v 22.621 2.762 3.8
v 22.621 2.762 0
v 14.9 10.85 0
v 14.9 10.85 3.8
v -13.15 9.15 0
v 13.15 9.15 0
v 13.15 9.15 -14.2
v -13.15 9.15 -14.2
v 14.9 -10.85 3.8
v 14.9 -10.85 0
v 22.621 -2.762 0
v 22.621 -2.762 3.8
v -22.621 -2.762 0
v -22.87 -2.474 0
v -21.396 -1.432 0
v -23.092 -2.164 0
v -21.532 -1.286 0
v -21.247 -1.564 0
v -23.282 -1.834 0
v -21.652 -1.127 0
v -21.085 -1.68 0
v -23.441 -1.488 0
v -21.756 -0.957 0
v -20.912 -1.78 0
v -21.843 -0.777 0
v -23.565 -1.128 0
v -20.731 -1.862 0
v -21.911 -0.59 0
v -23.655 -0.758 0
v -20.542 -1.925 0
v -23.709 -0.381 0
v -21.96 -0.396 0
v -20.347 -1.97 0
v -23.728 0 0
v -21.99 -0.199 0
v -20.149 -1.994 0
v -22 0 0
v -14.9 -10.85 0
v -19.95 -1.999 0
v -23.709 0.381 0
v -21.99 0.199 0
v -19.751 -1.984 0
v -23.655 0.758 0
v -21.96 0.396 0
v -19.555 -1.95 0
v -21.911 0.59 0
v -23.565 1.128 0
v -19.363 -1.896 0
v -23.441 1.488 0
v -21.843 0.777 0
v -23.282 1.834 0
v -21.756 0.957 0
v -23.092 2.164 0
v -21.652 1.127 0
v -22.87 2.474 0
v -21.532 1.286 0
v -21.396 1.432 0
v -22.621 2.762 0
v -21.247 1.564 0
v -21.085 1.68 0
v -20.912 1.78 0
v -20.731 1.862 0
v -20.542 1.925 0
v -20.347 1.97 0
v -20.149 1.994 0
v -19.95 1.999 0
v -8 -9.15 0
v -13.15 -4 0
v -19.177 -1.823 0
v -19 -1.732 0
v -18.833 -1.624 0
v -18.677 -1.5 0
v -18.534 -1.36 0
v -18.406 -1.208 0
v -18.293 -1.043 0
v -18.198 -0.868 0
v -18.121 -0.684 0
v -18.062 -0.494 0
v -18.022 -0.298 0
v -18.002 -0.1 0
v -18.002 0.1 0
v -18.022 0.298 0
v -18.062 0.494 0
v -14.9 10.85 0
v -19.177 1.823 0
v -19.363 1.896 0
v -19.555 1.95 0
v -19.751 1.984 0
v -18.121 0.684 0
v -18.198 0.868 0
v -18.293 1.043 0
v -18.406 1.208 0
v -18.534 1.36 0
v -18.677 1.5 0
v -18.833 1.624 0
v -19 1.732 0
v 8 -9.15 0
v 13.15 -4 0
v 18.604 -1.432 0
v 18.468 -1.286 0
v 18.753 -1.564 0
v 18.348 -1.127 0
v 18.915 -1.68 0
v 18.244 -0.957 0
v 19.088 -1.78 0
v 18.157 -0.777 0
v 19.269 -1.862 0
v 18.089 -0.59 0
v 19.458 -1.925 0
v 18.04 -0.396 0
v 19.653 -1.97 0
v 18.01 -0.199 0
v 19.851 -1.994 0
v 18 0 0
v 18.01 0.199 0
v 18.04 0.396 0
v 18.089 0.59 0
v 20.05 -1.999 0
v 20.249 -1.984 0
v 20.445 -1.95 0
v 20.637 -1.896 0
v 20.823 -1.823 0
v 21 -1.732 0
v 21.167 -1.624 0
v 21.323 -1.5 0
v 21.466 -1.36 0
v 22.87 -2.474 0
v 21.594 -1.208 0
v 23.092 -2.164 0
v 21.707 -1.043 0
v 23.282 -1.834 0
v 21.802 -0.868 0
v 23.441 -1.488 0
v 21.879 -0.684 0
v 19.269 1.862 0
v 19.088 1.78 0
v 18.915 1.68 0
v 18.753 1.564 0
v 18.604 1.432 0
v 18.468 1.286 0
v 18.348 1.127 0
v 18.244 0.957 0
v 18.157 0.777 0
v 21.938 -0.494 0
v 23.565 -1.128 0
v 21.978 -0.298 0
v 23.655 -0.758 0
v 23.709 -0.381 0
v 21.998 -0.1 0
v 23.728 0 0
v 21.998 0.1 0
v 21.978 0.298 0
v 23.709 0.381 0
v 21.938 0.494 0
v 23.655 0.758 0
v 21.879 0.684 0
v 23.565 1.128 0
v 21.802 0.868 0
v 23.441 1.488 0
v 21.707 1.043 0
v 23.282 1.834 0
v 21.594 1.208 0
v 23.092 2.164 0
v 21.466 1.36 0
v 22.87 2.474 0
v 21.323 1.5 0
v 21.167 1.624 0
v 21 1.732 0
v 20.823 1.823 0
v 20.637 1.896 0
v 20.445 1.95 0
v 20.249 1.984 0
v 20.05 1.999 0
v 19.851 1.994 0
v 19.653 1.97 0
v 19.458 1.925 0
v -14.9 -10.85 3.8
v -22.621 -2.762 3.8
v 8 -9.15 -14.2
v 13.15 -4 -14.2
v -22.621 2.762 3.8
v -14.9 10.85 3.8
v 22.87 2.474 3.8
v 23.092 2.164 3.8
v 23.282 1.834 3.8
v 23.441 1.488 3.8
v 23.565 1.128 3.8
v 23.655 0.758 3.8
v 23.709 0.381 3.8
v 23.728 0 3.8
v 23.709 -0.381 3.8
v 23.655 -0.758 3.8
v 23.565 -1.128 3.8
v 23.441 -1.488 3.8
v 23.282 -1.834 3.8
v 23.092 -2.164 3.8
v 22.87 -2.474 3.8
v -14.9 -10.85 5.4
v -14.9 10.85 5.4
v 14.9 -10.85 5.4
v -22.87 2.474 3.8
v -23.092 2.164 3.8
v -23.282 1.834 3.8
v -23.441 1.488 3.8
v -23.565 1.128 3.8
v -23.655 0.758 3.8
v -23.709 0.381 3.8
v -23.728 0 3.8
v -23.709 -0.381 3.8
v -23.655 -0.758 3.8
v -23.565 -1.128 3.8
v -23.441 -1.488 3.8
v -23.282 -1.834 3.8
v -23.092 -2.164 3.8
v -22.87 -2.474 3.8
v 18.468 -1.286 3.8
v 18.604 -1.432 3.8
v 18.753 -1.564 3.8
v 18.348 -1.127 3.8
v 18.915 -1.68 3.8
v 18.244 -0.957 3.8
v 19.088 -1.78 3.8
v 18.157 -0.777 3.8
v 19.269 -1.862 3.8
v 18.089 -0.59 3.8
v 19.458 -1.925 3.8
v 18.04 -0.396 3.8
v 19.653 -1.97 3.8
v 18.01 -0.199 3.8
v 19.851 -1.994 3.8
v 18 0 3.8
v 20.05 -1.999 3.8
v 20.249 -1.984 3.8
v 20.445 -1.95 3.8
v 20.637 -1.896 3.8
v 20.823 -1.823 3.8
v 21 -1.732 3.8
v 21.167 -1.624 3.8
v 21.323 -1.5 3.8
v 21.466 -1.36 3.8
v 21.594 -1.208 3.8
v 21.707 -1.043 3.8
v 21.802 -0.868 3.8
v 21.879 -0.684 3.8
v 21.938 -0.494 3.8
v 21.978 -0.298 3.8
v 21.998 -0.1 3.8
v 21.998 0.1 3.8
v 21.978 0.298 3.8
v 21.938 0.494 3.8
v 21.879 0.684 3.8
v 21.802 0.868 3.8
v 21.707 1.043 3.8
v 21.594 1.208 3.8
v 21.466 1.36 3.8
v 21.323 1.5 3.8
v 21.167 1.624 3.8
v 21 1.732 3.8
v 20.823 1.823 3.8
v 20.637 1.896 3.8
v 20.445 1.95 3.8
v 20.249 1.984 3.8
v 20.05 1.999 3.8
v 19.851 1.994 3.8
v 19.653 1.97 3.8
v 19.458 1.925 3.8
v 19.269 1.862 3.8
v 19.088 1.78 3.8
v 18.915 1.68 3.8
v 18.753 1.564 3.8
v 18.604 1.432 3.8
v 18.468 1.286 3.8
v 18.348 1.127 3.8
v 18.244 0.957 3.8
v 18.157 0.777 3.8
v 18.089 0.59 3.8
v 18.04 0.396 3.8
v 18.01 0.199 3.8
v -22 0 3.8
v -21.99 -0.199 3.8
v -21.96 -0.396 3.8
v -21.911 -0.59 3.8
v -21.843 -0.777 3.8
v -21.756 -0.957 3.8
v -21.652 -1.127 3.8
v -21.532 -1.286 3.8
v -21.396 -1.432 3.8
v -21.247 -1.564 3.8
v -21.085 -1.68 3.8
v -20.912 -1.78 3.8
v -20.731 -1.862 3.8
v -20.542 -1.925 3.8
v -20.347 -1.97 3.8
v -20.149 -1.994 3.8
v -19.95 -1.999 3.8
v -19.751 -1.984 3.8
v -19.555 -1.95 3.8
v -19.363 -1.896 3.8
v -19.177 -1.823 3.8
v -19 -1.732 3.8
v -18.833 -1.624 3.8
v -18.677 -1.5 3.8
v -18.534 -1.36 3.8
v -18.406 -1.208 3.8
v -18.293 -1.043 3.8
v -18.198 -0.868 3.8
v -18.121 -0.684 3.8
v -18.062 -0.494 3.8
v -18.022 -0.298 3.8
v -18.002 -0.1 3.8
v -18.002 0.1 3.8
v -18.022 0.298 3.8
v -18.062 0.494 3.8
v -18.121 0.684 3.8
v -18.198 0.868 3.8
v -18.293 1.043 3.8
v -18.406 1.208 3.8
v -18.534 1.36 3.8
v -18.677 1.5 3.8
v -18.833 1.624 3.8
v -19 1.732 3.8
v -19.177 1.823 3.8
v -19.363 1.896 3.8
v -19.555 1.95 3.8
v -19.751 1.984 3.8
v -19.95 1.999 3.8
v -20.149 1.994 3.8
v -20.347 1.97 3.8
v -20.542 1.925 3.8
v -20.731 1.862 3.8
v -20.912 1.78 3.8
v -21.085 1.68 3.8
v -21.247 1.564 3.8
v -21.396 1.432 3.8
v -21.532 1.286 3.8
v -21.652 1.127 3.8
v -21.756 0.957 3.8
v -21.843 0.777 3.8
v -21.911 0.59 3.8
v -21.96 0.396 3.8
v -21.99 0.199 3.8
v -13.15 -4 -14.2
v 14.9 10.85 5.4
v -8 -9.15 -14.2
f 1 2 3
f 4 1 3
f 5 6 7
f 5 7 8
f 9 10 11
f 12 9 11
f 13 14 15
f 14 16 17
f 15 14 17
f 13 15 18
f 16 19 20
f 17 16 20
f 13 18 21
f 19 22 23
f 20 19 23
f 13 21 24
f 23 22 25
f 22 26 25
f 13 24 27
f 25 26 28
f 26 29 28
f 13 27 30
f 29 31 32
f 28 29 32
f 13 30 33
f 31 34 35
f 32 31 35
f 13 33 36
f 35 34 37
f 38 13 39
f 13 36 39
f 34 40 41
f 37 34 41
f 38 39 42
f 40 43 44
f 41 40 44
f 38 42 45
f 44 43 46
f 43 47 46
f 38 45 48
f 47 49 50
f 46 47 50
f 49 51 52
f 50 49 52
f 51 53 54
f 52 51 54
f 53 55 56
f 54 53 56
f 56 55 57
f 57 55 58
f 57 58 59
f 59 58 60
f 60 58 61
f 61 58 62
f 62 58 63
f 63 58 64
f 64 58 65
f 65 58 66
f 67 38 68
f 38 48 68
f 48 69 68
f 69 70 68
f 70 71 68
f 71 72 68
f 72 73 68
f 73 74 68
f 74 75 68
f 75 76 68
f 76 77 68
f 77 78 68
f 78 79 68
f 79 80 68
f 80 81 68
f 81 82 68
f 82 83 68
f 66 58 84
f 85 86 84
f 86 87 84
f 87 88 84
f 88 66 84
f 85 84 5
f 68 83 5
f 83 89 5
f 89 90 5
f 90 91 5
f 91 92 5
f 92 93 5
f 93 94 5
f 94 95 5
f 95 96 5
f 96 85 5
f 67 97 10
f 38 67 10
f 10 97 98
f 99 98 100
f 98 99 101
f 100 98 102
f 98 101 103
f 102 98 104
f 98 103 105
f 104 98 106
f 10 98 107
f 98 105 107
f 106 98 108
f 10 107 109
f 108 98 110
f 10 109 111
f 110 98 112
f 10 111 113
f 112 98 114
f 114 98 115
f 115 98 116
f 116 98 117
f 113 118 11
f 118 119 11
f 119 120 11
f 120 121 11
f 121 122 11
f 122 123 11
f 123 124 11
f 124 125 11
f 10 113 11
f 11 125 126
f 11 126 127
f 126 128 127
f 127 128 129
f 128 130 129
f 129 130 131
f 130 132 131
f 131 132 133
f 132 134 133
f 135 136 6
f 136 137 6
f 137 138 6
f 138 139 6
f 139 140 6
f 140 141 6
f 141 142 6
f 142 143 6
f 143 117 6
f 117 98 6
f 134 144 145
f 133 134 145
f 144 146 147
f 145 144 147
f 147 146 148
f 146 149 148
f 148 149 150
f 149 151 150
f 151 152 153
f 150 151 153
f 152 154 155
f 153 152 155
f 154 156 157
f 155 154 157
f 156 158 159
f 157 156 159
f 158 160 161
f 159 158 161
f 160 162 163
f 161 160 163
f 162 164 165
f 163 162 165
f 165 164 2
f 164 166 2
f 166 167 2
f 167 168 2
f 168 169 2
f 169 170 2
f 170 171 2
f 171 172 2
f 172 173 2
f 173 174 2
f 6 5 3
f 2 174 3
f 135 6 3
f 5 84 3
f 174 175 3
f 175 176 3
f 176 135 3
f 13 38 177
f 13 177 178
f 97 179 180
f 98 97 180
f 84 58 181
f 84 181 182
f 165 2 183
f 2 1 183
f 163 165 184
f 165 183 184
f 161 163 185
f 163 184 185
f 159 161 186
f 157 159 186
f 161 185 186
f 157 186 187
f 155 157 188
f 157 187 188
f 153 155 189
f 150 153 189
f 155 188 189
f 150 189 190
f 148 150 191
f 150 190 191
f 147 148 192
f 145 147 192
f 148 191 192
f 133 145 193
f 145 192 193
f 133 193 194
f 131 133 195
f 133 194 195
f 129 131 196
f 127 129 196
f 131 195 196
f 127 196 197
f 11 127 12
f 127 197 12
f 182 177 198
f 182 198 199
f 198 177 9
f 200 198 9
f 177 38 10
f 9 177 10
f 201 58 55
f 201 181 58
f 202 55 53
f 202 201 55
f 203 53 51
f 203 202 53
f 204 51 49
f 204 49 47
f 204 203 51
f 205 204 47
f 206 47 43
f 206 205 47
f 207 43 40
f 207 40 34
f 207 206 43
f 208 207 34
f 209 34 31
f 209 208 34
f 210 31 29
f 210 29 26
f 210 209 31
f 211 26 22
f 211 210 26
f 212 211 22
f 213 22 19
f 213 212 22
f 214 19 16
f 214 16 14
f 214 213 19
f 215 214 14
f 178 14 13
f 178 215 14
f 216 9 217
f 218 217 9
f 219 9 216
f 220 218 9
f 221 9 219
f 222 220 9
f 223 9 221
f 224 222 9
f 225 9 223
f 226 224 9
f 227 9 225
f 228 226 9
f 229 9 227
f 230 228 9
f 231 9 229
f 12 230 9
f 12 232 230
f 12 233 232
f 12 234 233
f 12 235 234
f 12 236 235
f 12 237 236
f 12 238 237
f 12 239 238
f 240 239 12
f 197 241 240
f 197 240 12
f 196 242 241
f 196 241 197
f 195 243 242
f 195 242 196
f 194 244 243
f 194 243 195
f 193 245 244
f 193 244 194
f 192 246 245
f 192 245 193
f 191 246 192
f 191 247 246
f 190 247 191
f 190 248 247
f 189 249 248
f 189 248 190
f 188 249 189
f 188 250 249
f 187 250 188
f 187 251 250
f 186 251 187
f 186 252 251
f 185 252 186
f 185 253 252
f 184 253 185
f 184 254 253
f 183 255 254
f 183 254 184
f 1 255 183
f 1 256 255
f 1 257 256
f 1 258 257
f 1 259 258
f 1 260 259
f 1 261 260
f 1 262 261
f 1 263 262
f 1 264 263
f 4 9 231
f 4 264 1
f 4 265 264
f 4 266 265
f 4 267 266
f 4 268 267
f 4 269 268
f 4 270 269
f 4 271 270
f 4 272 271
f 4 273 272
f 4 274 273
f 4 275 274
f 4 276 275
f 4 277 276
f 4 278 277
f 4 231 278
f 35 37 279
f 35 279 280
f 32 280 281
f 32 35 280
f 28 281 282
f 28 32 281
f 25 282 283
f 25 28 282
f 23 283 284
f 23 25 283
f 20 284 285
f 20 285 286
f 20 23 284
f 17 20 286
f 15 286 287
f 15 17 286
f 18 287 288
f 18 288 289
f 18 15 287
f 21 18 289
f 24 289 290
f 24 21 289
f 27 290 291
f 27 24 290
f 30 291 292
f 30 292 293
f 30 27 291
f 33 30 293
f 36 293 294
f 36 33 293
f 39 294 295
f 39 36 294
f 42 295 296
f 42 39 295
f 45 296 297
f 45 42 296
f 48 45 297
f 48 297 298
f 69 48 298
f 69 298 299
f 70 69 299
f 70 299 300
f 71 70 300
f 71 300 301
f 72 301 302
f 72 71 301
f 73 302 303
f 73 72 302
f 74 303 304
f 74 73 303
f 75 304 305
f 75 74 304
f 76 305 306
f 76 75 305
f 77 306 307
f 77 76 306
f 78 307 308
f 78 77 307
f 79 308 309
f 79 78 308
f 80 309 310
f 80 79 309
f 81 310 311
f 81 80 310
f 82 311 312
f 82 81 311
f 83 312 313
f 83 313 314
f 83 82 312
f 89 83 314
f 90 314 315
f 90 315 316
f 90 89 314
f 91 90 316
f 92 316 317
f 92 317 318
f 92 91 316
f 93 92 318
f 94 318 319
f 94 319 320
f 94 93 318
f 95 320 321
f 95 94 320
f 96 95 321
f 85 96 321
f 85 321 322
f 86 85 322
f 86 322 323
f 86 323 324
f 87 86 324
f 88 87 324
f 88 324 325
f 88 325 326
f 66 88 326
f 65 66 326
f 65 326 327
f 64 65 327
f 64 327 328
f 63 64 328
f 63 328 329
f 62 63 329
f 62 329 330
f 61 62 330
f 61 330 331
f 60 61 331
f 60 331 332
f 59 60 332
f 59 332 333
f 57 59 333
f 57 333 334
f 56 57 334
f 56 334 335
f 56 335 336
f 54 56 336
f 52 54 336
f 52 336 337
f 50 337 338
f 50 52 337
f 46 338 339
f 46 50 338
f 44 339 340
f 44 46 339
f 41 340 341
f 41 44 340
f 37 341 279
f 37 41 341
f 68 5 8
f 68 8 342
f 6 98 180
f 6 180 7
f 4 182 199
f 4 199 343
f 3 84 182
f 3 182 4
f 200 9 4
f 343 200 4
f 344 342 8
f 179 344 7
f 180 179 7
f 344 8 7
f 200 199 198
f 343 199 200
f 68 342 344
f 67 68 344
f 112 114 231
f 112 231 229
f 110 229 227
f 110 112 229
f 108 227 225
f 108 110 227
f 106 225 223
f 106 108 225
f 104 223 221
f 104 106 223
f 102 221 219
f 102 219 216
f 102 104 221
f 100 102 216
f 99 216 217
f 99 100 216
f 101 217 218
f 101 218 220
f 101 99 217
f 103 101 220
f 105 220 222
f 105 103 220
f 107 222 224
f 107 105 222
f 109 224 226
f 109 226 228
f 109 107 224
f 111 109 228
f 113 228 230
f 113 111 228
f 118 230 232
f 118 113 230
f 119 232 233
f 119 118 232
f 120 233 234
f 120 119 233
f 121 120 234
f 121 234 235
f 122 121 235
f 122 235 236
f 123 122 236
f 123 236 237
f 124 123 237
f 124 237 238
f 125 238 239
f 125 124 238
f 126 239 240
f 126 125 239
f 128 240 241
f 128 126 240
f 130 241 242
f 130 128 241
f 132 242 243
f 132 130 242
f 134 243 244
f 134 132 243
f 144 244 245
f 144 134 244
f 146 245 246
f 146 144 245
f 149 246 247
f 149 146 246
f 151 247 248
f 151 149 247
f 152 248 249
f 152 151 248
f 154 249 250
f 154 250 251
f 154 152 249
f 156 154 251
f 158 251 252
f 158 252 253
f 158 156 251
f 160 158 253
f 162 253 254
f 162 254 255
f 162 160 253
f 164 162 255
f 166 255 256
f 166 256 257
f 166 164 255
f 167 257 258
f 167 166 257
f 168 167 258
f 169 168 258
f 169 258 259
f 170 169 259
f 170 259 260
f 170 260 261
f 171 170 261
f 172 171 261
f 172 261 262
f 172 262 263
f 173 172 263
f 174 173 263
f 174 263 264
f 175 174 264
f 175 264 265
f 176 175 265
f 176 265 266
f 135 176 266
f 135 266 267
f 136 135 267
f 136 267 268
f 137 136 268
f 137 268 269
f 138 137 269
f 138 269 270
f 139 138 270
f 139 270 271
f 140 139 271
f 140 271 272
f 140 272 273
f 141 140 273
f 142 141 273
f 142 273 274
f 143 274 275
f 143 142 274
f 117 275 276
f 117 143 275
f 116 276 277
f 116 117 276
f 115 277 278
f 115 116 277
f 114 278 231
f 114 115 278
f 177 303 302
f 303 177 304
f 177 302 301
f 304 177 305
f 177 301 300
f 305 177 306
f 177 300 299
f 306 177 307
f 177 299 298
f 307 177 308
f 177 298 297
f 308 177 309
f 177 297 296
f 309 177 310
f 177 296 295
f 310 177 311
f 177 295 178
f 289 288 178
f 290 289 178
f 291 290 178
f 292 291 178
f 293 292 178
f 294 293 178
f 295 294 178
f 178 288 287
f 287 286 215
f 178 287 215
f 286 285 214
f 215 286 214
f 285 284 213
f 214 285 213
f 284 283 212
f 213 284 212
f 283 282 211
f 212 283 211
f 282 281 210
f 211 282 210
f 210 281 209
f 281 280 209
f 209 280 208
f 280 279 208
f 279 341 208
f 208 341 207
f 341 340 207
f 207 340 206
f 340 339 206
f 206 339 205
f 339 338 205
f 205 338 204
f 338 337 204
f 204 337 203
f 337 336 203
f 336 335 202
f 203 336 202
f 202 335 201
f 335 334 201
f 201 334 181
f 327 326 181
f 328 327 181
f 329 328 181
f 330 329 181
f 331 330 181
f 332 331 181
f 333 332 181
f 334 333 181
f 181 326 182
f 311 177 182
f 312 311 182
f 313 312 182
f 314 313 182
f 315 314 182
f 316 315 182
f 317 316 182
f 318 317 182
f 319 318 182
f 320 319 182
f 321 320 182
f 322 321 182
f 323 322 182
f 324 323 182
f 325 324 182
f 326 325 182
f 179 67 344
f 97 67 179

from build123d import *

# Parameters (mm, degrees)
SKETCH1_W           = 29.8
SKETCH1_H           = 21.7
BOSS_EXTRUDE1_DEPTH = 5.4
SKETCH2_R           = 2
BOSS_EXTRUDE2_DEPTH = 3.8
FILLET1_R           = 4
BOSS_EXTRUDE3_DEPTH = 14.2


with BuildPart() as part:
    # Sketch1 → Boss-Extrude1 (new body)
    with BuildSketch(Plane.XY):
        Rectangle(SKETCH1_W, SKETCH1_H)
    extrude(amount=BOSS_EXTRUDE1_DEPTH)

    # Sketch2 → Boss-Extrude2 (add)
    # profile 1 of 2: a face of its own
    with BuildSketch(Plane.XY):
        Polygon((14.9, 10.85), (14.9, -10.85), (25.257485216, 0), align=None)
        with Locations(Location((20, 0, 0), (0, 0, 180))):
            Circle(SKETCH2_R, mode=Mode.SUBTRACT)
    # profile 2 of 2: a face of its own
    with BuildSketch(Plane.XY):
        Polygon((-14.9, 10.85), (-14.9, -10.85), (-25.257485216, 0), align=None)
        with Locations(Location((-20, 0, 0), (0, 0, 180))):
            Circle(SKETCH2_R, mode=Mode.SUBTRACT)
    extrude(amount=BOSS_EXTRUDE2_DEPTH)

    # Fillet1
    fillet1_edges = [part.edges().sort_by_distance(p)[0] for p in [
        (25.257485216, 0, 1.9),
        (-25.257485216, 0, 1.9),
    ]]
    fillet(fillet1_edges, radius=FILLET1_R)

    # Sketch3 → Boss-Extrude3 (add)
    with BuildSketch(Plane(origin=(0, 0, 0), x_dir=(-1, 0, 0), z_dir=(0, 0, -1))):
        Polygon((-13.15, 9.15), (13.15, 9.15), (13.15, -4), (8, -9.15), (-8, -9.15), (-13.15, -4), align=None)
    extrude(amount=BOSS_EXTRUDE3_DEPTH)


solid = part.part
